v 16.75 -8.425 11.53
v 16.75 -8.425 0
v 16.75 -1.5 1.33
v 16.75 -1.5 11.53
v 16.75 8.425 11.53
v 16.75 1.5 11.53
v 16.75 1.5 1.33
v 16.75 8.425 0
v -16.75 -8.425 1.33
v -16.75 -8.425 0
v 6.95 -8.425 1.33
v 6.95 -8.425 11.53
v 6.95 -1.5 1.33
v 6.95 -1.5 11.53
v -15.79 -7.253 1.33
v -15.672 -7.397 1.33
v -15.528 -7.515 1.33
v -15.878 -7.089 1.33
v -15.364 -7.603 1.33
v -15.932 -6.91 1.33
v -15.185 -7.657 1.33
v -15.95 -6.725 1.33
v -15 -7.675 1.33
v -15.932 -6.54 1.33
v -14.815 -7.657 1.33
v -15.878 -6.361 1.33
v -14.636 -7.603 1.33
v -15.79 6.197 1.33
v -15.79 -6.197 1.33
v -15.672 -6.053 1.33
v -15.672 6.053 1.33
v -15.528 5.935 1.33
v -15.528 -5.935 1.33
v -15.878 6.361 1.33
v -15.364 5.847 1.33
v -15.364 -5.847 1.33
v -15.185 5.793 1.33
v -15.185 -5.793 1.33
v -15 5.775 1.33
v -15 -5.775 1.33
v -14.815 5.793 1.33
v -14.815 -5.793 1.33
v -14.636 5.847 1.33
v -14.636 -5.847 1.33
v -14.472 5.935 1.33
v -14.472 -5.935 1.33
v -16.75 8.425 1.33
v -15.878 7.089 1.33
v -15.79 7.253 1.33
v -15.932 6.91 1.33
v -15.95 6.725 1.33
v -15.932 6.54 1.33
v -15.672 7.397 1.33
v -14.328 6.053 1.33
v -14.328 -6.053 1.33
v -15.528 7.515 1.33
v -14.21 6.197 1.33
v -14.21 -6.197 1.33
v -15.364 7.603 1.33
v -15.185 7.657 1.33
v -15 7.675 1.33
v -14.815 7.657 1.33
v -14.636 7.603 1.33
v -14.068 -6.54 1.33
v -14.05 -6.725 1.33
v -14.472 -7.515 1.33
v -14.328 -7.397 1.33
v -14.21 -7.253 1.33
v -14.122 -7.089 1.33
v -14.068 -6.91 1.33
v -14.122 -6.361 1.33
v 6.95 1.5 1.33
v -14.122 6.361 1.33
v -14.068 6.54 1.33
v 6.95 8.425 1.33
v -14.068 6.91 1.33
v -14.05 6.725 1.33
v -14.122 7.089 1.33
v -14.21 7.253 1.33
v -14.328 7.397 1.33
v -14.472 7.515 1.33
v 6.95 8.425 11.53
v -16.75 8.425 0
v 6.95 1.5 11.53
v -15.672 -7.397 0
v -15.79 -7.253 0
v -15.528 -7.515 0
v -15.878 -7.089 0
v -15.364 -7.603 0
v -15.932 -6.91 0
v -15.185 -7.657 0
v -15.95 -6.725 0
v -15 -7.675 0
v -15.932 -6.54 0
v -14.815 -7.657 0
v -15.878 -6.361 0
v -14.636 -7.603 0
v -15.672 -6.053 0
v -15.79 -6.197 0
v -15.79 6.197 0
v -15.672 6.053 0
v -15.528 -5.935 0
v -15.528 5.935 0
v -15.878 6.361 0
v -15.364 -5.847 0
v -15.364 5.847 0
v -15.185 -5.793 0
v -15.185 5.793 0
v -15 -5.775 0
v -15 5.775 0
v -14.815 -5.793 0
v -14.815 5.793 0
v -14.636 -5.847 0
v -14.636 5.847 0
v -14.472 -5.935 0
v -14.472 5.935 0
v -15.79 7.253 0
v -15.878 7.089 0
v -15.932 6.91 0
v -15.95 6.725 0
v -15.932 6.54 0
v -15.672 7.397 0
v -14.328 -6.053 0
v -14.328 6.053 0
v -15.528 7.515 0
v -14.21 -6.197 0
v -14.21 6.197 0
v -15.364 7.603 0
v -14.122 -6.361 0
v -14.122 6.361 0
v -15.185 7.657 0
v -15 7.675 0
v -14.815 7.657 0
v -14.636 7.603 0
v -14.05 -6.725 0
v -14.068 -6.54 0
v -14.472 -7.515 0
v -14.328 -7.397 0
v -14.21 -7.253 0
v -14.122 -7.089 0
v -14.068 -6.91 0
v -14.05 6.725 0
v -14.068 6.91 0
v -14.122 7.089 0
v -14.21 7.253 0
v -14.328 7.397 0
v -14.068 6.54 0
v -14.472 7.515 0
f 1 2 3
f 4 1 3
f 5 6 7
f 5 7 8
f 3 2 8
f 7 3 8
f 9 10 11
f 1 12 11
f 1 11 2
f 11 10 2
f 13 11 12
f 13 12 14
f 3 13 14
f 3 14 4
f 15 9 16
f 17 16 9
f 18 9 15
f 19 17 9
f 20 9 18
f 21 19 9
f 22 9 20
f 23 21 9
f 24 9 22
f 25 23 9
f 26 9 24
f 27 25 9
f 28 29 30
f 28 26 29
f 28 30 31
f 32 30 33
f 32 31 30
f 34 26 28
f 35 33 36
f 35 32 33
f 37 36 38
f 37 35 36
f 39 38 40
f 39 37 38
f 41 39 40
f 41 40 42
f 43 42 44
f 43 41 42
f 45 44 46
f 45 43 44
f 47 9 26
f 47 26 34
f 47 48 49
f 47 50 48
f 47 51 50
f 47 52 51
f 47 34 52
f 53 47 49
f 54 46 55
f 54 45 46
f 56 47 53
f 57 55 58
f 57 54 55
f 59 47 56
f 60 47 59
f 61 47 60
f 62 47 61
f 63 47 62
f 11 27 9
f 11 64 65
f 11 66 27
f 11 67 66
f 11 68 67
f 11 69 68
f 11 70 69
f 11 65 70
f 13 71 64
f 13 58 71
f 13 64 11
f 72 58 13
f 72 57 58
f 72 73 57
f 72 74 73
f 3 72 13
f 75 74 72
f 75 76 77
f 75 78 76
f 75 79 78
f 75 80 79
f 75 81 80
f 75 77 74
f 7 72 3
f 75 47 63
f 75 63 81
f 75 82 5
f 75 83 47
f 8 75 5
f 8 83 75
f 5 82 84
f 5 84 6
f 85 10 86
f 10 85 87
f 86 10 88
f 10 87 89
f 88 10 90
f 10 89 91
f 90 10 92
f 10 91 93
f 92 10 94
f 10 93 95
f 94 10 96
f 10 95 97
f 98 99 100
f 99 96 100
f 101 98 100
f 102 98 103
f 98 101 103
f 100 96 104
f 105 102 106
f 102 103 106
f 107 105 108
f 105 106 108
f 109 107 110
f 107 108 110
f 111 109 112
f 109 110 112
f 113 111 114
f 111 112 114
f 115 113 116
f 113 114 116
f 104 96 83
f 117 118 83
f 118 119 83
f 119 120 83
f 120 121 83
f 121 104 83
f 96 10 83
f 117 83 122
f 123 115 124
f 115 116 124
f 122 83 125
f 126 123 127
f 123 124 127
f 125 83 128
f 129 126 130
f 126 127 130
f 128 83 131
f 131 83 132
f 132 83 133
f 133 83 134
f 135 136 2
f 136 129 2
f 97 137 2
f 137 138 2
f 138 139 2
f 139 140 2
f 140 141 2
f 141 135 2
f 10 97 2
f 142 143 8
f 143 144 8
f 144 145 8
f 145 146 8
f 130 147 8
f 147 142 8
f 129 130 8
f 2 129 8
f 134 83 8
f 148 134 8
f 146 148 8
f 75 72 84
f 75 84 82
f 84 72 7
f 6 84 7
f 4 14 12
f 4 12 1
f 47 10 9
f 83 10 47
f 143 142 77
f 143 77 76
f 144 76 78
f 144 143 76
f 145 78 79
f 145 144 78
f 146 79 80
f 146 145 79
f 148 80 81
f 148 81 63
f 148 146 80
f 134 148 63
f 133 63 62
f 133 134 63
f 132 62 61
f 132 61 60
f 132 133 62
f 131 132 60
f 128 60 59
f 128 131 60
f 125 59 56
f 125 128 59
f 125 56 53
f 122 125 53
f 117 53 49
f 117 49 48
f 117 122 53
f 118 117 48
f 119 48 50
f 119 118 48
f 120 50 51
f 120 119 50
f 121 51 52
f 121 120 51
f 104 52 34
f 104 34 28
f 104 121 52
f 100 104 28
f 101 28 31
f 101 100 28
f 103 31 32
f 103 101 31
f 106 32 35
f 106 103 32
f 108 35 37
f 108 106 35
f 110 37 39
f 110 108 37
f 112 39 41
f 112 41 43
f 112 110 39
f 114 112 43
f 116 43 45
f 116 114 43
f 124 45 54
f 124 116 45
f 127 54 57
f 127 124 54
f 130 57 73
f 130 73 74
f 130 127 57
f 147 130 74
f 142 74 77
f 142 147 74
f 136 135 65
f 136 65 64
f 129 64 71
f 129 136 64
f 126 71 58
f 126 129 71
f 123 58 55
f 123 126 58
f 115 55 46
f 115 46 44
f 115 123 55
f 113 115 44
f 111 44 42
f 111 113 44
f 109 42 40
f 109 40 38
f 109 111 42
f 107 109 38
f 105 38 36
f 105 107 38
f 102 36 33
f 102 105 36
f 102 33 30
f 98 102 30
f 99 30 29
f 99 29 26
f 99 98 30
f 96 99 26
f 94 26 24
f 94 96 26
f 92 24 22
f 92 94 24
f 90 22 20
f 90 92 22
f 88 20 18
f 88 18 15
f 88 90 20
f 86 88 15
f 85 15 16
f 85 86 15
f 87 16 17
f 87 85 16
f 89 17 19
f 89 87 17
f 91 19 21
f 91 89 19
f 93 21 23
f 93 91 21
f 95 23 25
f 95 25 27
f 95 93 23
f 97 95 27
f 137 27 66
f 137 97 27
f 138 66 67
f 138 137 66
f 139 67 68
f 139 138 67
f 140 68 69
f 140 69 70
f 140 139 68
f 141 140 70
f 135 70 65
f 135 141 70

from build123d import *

# Parameters (mm, degrees)
SKETCH1_W           = 33.5
SKETCH1_H           = 16.85
SKETCH1_R           = 0.95
BOSS_EXTRUDE1_DEPTH = 1.33
SKETCH2_W           = 9.8
SKETCH2_H           = 6.925
BOSS_EXTRUDE2_DEPTH = 10.2


with BuildPart() as part:
    # Sketch1 → Boss-Extrude1 (new body)
    with BuildSketch(Plane.XY):
        Rectangle(SKETCH1_W, SKETCH1_H)
        with Locations((-15, -6.725)):
            Circle(SKETCH1_R, mode=Mode.SUBTRACT)
        with Locations((-15, 6.725)):
            Circle(SKETCH1_R, mode=Mode.SUBTRACT)
    extrude(amount=BOSS_EXTRUDE1_DEPTH)

    # Sketch2 → Boss-Extrude2 (add)
    with BuildSketch(Plane.XY.offset(1.33)):
        with Locations((11.85, 4.9625)):
            Rectangle(SKETCH2_W, SKETCH2_H)
        with Locations((11.85, -4.9625)):
            Rectangle(SKETCH2_W, SKETCH2_H)
    extrude(amount=BOSS_EXTRUDE2_DEPTH)


solid = part.part
